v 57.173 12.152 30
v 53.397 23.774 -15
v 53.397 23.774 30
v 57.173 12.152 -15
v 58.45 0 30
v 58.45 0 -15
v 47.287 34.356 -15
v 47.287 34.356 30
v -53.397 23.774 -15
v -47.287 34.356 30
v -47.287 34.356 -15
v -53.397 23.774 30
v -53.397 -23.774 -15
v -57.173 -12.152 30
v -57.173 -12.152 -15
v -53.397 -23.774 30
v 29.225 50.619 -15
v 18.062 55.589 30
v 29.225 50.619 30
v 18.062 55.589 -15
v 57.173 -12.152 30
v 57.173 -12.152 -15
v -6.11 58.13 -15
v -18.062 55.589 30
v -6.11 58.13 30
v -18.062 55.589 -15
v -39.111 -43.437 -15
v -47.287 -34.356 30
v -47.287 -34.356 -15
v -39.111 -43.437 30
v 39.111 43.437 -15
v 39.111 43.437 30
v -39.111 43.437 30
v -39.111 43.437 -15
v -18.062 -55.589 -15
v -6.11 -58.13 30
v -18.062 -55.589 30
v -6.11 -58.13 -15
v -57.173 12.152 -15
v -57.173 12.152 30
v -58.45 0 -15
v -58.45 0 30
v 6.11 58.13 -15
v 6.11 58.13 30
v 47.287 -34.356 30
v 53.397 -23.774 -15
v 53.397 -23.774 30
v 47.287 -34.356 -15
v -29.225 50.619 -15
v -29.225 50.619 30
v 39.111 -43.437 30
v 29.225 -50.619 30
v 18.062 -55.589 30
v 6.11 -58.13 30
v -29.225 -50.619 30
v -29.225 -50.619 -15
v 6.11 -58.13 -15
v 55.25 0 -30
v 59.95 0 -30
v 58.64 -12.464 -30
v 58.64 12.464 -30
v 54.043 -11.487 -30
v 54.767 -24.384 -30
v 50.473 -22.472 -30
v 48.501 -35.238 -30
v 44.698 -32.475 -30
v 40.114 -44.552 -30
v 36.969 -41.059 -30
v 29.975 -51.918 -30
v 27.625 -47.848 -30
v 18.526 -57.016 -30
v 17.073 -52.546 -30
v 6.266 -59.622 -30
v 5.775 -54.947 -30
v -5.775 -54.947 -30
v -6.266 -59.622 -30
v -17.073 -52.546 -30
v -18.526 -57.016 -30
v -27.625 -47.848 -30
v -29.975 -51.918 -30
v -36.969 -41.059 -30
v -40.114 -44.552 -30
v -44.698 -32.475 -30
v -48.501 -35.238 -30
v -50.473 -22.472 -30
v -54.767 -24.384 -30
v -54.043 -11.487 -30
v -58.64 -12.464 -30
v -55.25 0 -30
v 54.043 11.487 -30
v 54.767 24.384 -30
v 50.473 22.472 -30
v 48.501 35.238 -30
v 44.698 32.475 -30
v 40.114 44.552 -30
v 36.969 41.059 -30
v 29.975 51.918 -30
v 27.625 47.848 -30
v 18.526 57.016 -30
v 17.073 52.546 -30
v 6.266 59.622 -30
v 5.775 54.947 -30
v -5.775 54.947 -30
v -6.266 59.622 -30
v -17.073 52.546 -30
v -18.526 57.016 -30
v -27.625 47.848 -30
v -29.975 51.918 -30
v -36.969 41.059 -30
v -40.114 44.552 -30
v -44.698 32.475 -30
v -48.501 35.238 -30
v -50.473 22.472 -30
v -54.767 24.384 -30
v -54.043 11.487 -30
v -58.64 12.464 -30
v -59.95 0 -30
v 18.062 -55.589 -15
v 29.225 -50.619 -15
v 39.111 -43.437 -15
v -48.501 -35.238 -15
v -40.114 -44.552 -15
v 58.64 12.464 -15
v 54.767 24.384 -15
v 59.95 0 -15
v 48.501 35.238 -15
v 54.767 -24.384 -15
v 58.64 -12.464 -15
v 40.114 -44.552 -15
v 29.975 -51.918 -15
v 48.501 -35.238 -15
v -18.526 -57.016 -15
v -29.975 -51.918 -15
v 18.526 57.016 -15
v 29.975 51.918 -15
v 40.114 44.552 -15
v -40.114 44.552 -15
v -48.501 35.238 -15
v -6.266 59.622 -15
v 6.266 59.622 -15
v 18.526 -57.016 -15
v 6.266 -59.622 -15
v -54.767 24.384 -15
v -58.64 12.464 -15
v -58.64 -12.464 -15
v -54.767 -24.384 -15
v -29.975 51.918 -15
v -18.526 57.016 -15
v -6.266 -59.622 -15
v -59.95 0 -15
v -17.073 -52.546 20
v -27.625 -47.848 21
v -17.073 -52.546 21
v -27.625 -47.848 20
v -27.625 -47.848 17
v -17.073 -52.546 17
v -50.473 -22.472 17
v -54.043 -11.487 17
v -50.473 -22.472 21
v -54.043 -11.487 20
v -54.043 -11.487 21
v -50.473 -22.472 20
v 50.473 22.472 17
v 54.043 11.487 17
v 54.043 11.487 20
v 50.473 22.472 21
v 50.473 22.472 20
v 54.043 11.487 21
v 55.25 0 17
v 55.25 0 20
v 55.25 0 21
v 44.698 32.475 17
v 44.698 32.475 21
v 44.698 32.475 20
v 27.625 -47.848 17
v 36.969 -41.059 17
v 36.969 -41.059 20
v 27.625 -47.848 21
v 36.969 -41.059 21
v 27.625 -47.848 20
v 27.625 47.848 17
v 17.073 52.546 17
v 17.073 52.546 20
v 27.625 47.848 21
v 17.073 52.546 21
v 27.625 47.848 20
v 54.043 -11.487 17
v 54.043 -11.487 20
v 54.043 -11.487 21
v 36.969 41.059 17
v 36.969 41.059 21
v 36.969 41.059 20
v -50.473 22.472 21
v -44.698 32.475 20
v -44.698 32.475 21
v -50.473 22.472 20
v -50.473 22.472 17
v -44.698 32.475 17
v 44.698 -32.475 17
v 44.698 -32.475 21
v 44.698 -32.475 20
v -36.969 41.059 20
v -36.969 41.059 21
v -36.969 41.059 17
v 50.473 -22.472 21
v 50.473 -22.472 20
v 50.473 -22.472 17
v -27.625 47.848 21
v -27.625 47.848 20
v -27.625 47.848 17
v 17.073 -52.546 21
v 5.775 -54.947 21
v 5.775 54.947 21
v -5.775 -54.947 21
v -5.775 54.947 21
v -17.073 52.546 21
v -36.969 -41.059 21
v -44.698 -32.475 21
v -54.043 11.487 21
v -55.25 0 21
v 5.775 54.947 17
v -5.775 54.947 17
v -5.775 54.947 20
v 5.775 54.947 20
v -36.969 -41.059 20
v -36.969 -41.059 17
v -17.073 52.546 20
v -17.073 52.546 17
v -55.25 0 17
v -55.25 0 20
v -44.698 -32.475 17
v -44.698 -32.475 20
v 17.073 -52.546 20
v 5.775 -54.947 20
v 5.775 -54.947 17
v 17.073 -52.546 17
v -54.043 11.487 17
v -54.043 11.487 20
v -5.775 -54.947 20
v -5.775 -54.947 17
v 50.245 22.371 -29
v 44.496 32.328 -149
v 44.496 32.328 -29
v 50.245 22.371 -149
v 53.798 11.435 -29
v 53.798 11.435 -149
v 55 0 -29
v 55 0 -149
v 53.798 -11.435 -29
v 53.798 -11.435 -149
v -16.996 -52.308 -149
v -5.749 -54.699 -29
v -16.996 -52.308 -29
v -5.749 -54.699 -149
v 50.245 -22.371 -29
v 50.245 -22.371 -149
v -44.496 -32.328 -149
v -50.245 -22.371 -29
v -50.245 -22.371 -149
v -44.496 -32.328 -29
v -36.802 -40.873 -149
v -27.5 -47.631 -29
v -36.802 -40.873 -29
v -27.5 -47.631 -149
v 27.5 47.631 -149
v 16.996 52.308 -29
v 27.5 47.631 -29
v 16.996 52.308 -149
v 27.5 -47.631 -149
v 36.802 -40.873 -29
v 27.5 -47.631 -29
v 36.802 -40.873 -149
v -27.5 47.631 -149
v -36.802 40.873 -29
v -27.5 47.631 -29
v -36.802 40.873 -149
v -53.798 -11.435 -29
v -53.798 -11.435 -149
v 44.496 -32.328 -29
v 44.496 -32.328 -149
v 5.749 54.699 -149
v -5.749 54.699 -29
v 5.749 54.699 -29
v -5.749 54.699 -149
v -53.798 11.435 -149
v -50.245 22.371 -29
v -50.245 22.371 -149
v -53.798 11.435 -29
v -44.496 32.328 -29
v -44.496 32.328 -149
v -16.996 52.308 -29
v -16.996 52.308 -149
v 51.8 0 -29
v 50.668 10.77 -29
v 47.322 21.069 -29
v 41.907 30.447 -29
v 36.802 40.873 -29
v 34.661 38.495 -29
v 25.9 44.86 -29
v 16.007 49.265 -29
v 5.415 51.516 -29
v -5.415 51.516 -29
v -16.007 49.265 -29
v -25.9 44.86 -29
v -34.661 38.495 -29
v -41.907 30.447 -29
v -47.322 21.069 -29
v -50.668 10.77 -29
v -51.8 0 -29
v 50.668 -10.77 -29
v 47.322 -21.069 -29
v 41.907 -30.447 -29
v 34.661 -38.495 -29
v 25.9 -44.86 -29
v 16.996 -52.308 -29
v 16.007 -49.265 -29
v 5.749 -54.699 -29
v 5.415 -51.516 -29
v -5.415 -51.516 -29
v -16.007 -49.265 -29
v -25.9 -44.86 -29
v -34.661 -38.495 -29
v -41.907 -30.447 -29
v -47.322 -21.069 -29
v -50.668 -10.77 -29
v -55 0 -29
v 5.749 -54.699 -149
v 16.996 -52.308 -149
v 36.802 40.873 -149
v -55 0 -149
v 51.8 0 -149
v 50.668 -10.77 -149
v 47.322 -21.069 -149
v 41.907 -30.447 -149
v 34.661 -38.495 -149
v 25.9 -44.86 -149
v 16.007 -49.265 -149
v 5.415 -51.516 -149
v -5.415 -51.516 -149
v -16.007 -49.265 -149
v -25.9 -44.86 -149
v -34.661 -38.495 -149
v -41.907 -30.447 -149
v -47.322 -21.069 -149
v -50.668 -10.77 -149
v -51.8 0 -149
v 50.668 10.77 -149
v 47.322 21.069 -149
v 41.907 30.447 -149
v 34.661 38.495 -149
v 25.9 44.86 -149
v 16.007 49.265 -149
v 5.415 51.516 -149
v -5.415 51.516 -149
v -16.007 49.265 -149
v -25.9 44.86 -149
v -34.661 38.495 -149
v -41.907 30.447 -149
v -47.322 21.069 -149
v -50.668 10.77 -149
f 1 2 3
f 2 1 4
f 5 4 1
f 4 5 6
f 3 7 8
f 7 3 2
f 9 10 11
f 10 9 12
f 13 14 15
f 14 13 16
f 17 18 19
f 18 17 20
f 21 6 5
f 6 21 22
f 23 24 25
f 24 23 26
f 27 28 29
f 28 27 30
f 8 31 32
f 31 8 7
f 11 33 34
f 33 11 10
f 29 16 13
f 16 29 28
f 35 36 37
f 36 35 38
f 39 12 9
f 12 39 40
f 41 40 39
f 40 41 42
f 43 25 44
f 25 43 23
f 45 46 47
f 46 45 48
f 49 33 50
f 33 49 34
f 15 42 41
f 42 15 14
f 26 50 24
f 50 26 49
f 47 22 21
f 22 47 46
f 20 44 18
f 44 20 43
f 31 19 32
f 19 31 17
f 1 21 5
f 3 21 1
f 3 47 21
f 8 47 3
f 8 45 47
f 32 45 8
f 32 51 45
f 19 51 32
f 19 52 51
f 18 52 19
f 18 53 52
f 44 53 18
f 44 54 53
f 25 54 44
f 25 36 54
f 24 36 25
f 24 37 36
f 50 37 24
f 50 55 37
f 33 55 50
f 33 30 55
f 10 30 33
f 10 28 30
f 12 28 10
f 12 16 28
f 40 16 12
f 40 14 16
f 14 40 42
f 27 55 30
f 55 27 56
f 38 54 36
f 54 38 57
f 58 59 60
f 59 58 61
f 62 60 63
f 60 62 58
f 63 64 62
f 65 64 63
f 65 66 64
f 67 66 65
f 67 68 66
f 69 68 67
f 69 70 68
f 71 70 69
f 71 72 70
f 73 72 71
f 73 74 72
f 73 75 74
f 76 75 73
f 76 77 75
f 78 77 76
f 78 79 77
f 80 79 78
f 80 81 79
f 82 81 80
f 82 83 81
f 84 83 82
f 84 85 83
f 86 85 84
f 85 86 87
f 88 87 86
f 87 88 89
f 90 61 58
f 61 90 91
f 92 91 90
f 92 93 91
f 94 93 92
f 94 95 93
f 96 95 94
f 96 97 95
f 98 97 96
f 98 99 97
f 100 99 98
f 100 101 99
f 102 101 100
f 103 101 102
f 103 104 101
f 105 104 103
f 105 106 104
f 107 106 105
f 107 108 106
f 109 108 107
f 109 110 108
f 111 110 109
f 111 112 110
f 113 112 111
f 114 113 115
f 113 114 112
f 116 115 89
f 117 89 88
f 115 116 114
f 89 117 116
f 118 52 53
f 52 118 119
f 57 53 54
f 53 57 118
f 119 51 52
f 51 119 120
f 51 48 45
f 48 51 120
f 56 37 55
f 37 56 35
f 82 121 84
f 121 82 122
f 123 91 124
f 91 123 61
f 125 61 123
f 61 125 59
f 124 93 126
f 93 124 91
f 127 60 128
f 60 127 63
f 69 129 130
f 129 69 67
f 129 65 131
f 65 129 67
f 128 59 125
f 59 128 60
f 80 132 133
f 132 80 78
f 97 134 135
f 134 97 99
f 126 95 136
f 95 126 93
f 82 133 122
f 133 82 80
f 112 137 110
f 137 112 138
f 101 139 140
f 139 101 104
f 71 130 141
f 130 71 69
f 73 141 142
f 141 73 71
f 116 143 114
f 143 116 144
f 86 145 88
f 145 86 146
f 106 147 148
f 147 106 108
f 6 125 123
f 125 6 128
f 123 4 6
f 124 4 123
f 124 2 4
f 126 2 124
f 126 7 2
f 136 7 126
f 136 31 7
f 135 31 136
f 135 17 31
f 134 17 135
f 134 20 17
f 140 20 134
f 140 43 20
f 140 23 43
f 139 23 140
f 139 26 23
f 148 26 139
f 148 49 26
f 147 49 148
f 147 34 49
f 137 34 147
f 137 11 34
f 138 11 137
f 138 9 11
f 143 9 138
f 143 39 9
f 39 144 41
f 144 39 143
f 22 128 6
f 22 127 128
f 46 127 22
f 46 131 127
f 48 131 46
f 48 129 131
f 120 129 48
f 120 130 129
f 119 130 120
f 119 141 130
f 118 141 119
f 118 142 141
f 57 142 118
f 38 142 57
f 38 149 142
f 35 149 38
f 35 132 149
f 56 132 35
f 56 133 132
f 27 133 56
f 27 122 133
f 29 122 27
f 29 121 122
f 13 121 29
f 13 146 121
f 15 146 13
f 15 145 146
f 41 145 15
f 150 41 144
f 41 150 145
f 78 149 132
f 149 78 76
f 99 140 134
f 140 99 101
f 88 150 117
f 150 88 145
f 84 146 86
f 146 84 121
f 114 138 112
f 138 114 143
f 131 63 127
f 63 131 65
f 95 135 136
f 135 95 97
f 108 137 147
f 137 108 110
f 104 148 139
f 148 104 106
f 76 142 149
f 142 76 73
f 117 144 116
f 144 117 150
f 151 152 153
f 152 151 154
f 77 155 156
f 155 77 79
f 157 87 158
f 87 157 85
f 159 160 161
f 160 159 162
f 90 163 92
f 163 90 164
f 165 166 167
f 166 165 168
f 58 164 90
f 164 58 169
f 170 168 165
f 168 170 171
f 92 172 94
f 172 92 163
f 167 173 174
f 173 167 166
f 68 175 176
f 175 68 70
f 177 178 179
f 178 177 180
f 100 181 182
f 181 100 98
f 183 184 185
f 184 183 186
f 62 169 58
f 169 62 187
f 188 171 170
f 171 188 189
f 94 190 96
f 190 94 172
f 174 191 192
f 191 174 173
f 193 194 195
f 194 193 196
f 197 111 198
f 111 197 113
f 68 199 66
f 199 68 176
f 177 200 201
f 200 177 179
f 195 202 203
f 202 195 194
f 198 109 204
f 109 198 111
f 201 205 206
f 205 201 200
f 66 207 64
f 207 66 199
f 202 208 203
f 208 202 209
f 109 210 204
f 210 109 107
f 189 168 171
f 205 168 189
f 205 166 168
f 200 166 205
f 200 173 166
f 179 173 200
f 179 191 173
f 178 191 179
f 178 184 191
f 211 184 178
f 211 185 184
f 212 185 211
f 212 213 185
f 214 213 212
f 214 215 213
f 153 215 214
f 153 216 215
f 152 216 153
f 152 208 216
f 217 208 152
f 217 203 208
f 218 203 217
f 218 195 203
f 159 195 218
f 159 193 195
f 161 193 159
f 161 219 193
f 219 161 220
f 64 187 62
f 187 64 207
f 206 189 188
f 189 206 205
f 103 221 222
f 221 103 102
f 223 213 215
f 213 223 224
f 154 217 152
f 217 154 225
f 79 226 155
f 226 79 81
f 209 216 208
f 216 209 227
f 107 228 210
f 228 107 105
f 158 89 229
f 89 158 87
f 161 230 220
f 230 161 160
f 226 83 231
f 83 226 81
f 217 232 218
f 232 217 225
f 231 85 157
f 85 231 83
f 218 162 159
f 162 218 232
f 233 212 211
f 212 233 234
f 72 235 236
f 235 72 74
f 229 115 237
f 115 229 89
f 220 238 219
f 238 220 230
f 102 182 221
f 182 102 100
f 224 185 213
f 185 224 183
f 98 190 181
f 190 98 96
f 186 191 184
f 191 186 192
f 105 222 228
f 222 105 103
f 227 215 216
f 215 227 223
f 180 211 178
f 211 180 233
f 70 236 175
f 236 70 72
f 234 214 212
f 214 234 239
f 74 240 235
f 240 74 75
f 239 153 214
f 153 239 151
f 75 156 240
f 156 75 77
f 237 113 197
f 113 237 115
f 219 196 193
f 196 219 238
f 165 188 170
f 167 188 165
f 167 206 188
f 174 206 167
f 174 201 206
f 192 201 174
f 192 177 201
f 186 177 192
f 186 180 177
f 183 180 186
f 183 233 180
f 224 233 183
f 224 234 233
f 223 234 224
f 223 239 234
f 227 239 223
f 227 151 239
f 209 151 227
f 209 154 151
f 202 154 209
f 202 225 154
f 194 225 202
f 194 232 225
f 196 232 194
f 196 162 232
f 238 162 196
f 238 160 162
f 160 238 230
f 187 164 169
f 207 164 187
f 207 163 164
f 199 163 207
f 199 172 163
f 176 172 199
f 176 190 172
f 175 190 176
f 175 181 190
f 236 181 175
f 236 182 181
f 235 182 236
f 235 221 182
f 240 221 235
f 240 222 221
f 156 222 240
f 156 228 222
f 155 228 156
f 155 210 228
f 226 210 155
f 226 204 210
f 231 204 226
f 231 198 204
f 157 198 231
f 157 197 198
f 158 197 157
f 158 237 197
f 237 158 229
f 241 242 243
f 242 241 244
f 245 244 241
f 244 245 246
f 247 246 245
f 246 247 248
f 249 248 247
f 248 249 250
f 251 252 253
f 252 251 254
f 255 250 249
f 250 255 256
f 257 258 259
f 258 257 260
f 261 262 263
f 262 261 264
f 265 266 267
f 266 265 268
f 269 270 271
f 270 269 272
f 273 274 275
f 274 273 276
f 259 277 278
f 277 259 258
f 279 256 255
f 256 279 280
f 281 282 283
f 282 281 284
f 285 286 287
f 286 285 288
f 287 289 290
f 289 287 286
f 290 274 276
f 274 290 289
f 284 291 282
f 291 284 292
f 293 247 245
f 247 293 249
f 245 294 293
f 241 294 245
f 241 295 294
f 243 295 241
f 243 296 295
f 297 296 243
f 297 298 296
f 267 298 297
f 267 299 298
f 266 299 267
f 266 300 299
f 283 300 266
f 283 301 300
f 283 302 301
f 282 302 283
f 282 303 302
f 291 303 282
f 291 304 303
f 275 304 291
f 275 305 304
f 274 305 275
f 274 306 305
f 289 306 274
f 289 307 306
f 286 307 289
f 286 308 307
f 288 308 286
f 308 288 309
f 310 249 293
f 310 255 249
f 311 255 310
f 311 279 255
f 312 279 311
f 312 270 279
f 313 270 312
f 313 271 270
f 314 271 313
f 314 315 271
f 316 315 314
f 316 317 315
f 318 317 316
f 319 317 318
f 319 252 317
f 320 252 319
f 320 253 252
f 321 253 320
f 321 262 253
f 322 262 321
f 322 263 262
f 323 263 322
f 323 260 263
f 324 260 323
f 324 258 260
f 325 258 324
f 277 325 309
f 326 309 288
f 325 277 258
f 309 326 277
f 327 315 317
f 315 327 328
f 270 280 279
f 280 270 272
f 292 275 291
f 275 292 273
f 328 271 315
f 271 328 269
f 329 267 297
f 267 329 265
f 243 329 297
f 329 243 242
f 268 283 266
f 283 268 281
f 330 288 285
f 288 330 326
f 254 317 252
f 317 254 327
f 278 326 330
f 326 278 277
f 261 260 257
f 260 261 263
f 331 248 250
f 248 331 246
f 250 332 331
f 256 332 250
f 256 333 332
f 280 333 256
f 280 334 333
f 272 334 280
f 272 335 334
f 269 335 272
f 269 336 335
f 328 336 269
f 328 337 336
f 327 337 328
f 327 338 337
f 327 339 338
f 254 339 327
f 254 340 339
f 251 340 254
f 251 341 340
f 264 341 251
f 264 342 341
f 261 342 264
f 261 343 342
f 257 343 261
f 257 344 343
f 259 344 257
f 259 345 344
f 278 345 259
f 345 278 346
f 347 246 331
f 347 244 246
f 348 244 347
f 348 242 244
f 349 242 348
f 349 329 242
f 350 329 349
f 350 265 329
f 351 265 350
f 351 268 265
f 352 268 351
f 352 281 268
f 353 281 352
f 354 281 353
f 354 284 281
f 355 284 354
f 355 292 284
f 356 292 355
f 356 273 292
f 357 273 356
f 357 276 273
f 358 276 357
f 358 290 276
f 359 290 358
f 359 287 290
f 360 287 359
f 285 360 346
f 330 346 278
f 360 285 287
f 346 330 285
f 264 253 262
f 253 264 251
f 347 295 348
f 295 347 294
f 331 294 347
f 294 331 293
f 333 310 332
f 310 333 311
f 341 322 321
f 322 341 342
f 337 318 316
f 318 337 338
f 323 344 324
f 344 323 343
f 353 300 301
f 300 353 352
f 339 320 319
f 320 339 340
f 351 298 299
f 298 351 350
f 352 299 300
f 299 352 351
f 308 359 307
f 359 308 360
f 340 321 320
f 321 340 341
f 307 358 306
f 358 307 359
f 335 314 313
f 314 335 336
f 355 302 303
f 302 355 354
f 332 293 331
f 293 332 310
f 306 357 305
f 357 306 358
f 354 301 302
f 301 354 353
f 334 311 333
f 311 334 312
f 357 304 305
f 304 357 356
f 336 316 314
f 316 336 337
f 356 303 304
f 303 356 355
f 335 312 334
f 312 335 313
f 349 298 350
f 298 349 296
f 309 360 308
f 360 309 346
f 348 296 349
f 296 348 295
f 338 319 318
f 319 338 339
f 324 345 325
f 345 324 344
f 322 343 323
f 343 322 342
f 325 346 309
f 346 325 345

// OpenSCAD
// Parameters
nominal_diameter_mm = 110; //[55:220:1]
pipe_outer_diameter_mm = 110; //[55:220:0.5]
socket_inner_diameter_mm = 110.5; //[55:221:0.1]
cap_wall_thickness_mm = 3.2; //[1.6:6.4:0.1]
end_face_thickness_mm = 4; //[2:8:0.1]
insertion_depth_mm = 50; //[25:100:1]
overall_height_mm = 60; //[30:120:1]
fillet_radius_mm = 1; //[0.5:3:0.1]
draft_angle_deg = 1; //[0:5:0.1]
tolerance_clearance_mm = 0.5; //[0.2:1.5:0.1]
overlap_mm = 1; //[0.5:2:0.1]
cap_outer_diameter_mm = 116.9; //[58.45:233.8:0.1]
stop_shoulder_thickness_mm = 3; //[1.5:6:0.1]
stop_shoulder_radial_mm = 2; //[1:5:0.1]
grip_band_height_mm = 15; //[7.5:30:0.5]
grip_band_radial_mm = 1.5; //[0.5:4:0.1]
pipe_wall_thickness_mm = 3.2; //[1.6:6.4:0.1]
pipe_length_mm = 120; //[60:240:1]

// HT Pipe - complete geometry
module ht_pipe() {
  color([0.85, 0.85, 0.8]) {
    difference() {
      // Outer pipe
      cylinder(r=pipe_outer_diameter_mm/2, h=pipe_length_mm, center=true);
      // Inner bore
      translate([0, 0, -overlap_mm/2])
        cylinder(r=pipe_outer_diameter_mm/2 - pipe_wall_thickness_mm, h=pipe_length_mm + overlap_mm, center=true);
    }
  }
}

// Cap assembly
module cap() {
  color([0.75, 0.75, 0.77]) {
    difference() {
      // Cap body with closed end
      union() {
        // Outer cap body
        cylinder(r=cap_outer_diameter_mm/2, h=overall_height_mm, center=true);
        // Closed end face
        translate([0, 0, overall_height_mm/2 - end_face_thickness_mm/2])
          cylinder(r=cap_outer_diameter_mm/2, h=end_face_thickness_mm, center=true);
        // Outer grip band
        translate([0, 0, -overall_height_mm/2 + grip_band_height_mm/2])
          cylinder(r=cap_outer_diameter_mm/2 + grip_band_radial_mm, h=grip_band_height_mm, center=true);
      }
      // Internal clearance bore
      translate([0, 0, -overall_height_mm/2 + (insertion_depth_mm + overlap_mm)/2])
        cylinder(r=socket_inner_diameter_mm/2, h=insertion_depth_mm + overlap_mm, center=true);
    }
    // Insertion stop shoulder
    union() {
      // Stop shoulder
      translate([0, 0, -overall_height_mm/2 + insertion_depth_mm - stop_shoulder_thickness_mm/2])
        cylinder(r=socket_inner_diameter_mm/2, h=stop_shoulder_thickness_mm, center=true);
      // Stop shoulder bore
      translate([0, 0, -overall_height_mm/2 + insertion_depth_mm - stop_shoulder_thickness_mm/2])
        difference() {
          cylinder(r=socket_inner_diameter_mm/2, h=stop_shoulder_thickness_mm, center=true);
          cylinder(r=socket_inner_diameter_mm/2 - stop_shoulder_radial_mm, h=stop_shoulder_thickness_mm + overlap_mm, center=true);
        }
    }
  }
}

// Assembly
module assembly() {
  cap();
  translate([0, 0, -overall_height_mm/2 - pipe_length_mm/2 + overlap_mm]) ht_pipe();
}

assembly();
